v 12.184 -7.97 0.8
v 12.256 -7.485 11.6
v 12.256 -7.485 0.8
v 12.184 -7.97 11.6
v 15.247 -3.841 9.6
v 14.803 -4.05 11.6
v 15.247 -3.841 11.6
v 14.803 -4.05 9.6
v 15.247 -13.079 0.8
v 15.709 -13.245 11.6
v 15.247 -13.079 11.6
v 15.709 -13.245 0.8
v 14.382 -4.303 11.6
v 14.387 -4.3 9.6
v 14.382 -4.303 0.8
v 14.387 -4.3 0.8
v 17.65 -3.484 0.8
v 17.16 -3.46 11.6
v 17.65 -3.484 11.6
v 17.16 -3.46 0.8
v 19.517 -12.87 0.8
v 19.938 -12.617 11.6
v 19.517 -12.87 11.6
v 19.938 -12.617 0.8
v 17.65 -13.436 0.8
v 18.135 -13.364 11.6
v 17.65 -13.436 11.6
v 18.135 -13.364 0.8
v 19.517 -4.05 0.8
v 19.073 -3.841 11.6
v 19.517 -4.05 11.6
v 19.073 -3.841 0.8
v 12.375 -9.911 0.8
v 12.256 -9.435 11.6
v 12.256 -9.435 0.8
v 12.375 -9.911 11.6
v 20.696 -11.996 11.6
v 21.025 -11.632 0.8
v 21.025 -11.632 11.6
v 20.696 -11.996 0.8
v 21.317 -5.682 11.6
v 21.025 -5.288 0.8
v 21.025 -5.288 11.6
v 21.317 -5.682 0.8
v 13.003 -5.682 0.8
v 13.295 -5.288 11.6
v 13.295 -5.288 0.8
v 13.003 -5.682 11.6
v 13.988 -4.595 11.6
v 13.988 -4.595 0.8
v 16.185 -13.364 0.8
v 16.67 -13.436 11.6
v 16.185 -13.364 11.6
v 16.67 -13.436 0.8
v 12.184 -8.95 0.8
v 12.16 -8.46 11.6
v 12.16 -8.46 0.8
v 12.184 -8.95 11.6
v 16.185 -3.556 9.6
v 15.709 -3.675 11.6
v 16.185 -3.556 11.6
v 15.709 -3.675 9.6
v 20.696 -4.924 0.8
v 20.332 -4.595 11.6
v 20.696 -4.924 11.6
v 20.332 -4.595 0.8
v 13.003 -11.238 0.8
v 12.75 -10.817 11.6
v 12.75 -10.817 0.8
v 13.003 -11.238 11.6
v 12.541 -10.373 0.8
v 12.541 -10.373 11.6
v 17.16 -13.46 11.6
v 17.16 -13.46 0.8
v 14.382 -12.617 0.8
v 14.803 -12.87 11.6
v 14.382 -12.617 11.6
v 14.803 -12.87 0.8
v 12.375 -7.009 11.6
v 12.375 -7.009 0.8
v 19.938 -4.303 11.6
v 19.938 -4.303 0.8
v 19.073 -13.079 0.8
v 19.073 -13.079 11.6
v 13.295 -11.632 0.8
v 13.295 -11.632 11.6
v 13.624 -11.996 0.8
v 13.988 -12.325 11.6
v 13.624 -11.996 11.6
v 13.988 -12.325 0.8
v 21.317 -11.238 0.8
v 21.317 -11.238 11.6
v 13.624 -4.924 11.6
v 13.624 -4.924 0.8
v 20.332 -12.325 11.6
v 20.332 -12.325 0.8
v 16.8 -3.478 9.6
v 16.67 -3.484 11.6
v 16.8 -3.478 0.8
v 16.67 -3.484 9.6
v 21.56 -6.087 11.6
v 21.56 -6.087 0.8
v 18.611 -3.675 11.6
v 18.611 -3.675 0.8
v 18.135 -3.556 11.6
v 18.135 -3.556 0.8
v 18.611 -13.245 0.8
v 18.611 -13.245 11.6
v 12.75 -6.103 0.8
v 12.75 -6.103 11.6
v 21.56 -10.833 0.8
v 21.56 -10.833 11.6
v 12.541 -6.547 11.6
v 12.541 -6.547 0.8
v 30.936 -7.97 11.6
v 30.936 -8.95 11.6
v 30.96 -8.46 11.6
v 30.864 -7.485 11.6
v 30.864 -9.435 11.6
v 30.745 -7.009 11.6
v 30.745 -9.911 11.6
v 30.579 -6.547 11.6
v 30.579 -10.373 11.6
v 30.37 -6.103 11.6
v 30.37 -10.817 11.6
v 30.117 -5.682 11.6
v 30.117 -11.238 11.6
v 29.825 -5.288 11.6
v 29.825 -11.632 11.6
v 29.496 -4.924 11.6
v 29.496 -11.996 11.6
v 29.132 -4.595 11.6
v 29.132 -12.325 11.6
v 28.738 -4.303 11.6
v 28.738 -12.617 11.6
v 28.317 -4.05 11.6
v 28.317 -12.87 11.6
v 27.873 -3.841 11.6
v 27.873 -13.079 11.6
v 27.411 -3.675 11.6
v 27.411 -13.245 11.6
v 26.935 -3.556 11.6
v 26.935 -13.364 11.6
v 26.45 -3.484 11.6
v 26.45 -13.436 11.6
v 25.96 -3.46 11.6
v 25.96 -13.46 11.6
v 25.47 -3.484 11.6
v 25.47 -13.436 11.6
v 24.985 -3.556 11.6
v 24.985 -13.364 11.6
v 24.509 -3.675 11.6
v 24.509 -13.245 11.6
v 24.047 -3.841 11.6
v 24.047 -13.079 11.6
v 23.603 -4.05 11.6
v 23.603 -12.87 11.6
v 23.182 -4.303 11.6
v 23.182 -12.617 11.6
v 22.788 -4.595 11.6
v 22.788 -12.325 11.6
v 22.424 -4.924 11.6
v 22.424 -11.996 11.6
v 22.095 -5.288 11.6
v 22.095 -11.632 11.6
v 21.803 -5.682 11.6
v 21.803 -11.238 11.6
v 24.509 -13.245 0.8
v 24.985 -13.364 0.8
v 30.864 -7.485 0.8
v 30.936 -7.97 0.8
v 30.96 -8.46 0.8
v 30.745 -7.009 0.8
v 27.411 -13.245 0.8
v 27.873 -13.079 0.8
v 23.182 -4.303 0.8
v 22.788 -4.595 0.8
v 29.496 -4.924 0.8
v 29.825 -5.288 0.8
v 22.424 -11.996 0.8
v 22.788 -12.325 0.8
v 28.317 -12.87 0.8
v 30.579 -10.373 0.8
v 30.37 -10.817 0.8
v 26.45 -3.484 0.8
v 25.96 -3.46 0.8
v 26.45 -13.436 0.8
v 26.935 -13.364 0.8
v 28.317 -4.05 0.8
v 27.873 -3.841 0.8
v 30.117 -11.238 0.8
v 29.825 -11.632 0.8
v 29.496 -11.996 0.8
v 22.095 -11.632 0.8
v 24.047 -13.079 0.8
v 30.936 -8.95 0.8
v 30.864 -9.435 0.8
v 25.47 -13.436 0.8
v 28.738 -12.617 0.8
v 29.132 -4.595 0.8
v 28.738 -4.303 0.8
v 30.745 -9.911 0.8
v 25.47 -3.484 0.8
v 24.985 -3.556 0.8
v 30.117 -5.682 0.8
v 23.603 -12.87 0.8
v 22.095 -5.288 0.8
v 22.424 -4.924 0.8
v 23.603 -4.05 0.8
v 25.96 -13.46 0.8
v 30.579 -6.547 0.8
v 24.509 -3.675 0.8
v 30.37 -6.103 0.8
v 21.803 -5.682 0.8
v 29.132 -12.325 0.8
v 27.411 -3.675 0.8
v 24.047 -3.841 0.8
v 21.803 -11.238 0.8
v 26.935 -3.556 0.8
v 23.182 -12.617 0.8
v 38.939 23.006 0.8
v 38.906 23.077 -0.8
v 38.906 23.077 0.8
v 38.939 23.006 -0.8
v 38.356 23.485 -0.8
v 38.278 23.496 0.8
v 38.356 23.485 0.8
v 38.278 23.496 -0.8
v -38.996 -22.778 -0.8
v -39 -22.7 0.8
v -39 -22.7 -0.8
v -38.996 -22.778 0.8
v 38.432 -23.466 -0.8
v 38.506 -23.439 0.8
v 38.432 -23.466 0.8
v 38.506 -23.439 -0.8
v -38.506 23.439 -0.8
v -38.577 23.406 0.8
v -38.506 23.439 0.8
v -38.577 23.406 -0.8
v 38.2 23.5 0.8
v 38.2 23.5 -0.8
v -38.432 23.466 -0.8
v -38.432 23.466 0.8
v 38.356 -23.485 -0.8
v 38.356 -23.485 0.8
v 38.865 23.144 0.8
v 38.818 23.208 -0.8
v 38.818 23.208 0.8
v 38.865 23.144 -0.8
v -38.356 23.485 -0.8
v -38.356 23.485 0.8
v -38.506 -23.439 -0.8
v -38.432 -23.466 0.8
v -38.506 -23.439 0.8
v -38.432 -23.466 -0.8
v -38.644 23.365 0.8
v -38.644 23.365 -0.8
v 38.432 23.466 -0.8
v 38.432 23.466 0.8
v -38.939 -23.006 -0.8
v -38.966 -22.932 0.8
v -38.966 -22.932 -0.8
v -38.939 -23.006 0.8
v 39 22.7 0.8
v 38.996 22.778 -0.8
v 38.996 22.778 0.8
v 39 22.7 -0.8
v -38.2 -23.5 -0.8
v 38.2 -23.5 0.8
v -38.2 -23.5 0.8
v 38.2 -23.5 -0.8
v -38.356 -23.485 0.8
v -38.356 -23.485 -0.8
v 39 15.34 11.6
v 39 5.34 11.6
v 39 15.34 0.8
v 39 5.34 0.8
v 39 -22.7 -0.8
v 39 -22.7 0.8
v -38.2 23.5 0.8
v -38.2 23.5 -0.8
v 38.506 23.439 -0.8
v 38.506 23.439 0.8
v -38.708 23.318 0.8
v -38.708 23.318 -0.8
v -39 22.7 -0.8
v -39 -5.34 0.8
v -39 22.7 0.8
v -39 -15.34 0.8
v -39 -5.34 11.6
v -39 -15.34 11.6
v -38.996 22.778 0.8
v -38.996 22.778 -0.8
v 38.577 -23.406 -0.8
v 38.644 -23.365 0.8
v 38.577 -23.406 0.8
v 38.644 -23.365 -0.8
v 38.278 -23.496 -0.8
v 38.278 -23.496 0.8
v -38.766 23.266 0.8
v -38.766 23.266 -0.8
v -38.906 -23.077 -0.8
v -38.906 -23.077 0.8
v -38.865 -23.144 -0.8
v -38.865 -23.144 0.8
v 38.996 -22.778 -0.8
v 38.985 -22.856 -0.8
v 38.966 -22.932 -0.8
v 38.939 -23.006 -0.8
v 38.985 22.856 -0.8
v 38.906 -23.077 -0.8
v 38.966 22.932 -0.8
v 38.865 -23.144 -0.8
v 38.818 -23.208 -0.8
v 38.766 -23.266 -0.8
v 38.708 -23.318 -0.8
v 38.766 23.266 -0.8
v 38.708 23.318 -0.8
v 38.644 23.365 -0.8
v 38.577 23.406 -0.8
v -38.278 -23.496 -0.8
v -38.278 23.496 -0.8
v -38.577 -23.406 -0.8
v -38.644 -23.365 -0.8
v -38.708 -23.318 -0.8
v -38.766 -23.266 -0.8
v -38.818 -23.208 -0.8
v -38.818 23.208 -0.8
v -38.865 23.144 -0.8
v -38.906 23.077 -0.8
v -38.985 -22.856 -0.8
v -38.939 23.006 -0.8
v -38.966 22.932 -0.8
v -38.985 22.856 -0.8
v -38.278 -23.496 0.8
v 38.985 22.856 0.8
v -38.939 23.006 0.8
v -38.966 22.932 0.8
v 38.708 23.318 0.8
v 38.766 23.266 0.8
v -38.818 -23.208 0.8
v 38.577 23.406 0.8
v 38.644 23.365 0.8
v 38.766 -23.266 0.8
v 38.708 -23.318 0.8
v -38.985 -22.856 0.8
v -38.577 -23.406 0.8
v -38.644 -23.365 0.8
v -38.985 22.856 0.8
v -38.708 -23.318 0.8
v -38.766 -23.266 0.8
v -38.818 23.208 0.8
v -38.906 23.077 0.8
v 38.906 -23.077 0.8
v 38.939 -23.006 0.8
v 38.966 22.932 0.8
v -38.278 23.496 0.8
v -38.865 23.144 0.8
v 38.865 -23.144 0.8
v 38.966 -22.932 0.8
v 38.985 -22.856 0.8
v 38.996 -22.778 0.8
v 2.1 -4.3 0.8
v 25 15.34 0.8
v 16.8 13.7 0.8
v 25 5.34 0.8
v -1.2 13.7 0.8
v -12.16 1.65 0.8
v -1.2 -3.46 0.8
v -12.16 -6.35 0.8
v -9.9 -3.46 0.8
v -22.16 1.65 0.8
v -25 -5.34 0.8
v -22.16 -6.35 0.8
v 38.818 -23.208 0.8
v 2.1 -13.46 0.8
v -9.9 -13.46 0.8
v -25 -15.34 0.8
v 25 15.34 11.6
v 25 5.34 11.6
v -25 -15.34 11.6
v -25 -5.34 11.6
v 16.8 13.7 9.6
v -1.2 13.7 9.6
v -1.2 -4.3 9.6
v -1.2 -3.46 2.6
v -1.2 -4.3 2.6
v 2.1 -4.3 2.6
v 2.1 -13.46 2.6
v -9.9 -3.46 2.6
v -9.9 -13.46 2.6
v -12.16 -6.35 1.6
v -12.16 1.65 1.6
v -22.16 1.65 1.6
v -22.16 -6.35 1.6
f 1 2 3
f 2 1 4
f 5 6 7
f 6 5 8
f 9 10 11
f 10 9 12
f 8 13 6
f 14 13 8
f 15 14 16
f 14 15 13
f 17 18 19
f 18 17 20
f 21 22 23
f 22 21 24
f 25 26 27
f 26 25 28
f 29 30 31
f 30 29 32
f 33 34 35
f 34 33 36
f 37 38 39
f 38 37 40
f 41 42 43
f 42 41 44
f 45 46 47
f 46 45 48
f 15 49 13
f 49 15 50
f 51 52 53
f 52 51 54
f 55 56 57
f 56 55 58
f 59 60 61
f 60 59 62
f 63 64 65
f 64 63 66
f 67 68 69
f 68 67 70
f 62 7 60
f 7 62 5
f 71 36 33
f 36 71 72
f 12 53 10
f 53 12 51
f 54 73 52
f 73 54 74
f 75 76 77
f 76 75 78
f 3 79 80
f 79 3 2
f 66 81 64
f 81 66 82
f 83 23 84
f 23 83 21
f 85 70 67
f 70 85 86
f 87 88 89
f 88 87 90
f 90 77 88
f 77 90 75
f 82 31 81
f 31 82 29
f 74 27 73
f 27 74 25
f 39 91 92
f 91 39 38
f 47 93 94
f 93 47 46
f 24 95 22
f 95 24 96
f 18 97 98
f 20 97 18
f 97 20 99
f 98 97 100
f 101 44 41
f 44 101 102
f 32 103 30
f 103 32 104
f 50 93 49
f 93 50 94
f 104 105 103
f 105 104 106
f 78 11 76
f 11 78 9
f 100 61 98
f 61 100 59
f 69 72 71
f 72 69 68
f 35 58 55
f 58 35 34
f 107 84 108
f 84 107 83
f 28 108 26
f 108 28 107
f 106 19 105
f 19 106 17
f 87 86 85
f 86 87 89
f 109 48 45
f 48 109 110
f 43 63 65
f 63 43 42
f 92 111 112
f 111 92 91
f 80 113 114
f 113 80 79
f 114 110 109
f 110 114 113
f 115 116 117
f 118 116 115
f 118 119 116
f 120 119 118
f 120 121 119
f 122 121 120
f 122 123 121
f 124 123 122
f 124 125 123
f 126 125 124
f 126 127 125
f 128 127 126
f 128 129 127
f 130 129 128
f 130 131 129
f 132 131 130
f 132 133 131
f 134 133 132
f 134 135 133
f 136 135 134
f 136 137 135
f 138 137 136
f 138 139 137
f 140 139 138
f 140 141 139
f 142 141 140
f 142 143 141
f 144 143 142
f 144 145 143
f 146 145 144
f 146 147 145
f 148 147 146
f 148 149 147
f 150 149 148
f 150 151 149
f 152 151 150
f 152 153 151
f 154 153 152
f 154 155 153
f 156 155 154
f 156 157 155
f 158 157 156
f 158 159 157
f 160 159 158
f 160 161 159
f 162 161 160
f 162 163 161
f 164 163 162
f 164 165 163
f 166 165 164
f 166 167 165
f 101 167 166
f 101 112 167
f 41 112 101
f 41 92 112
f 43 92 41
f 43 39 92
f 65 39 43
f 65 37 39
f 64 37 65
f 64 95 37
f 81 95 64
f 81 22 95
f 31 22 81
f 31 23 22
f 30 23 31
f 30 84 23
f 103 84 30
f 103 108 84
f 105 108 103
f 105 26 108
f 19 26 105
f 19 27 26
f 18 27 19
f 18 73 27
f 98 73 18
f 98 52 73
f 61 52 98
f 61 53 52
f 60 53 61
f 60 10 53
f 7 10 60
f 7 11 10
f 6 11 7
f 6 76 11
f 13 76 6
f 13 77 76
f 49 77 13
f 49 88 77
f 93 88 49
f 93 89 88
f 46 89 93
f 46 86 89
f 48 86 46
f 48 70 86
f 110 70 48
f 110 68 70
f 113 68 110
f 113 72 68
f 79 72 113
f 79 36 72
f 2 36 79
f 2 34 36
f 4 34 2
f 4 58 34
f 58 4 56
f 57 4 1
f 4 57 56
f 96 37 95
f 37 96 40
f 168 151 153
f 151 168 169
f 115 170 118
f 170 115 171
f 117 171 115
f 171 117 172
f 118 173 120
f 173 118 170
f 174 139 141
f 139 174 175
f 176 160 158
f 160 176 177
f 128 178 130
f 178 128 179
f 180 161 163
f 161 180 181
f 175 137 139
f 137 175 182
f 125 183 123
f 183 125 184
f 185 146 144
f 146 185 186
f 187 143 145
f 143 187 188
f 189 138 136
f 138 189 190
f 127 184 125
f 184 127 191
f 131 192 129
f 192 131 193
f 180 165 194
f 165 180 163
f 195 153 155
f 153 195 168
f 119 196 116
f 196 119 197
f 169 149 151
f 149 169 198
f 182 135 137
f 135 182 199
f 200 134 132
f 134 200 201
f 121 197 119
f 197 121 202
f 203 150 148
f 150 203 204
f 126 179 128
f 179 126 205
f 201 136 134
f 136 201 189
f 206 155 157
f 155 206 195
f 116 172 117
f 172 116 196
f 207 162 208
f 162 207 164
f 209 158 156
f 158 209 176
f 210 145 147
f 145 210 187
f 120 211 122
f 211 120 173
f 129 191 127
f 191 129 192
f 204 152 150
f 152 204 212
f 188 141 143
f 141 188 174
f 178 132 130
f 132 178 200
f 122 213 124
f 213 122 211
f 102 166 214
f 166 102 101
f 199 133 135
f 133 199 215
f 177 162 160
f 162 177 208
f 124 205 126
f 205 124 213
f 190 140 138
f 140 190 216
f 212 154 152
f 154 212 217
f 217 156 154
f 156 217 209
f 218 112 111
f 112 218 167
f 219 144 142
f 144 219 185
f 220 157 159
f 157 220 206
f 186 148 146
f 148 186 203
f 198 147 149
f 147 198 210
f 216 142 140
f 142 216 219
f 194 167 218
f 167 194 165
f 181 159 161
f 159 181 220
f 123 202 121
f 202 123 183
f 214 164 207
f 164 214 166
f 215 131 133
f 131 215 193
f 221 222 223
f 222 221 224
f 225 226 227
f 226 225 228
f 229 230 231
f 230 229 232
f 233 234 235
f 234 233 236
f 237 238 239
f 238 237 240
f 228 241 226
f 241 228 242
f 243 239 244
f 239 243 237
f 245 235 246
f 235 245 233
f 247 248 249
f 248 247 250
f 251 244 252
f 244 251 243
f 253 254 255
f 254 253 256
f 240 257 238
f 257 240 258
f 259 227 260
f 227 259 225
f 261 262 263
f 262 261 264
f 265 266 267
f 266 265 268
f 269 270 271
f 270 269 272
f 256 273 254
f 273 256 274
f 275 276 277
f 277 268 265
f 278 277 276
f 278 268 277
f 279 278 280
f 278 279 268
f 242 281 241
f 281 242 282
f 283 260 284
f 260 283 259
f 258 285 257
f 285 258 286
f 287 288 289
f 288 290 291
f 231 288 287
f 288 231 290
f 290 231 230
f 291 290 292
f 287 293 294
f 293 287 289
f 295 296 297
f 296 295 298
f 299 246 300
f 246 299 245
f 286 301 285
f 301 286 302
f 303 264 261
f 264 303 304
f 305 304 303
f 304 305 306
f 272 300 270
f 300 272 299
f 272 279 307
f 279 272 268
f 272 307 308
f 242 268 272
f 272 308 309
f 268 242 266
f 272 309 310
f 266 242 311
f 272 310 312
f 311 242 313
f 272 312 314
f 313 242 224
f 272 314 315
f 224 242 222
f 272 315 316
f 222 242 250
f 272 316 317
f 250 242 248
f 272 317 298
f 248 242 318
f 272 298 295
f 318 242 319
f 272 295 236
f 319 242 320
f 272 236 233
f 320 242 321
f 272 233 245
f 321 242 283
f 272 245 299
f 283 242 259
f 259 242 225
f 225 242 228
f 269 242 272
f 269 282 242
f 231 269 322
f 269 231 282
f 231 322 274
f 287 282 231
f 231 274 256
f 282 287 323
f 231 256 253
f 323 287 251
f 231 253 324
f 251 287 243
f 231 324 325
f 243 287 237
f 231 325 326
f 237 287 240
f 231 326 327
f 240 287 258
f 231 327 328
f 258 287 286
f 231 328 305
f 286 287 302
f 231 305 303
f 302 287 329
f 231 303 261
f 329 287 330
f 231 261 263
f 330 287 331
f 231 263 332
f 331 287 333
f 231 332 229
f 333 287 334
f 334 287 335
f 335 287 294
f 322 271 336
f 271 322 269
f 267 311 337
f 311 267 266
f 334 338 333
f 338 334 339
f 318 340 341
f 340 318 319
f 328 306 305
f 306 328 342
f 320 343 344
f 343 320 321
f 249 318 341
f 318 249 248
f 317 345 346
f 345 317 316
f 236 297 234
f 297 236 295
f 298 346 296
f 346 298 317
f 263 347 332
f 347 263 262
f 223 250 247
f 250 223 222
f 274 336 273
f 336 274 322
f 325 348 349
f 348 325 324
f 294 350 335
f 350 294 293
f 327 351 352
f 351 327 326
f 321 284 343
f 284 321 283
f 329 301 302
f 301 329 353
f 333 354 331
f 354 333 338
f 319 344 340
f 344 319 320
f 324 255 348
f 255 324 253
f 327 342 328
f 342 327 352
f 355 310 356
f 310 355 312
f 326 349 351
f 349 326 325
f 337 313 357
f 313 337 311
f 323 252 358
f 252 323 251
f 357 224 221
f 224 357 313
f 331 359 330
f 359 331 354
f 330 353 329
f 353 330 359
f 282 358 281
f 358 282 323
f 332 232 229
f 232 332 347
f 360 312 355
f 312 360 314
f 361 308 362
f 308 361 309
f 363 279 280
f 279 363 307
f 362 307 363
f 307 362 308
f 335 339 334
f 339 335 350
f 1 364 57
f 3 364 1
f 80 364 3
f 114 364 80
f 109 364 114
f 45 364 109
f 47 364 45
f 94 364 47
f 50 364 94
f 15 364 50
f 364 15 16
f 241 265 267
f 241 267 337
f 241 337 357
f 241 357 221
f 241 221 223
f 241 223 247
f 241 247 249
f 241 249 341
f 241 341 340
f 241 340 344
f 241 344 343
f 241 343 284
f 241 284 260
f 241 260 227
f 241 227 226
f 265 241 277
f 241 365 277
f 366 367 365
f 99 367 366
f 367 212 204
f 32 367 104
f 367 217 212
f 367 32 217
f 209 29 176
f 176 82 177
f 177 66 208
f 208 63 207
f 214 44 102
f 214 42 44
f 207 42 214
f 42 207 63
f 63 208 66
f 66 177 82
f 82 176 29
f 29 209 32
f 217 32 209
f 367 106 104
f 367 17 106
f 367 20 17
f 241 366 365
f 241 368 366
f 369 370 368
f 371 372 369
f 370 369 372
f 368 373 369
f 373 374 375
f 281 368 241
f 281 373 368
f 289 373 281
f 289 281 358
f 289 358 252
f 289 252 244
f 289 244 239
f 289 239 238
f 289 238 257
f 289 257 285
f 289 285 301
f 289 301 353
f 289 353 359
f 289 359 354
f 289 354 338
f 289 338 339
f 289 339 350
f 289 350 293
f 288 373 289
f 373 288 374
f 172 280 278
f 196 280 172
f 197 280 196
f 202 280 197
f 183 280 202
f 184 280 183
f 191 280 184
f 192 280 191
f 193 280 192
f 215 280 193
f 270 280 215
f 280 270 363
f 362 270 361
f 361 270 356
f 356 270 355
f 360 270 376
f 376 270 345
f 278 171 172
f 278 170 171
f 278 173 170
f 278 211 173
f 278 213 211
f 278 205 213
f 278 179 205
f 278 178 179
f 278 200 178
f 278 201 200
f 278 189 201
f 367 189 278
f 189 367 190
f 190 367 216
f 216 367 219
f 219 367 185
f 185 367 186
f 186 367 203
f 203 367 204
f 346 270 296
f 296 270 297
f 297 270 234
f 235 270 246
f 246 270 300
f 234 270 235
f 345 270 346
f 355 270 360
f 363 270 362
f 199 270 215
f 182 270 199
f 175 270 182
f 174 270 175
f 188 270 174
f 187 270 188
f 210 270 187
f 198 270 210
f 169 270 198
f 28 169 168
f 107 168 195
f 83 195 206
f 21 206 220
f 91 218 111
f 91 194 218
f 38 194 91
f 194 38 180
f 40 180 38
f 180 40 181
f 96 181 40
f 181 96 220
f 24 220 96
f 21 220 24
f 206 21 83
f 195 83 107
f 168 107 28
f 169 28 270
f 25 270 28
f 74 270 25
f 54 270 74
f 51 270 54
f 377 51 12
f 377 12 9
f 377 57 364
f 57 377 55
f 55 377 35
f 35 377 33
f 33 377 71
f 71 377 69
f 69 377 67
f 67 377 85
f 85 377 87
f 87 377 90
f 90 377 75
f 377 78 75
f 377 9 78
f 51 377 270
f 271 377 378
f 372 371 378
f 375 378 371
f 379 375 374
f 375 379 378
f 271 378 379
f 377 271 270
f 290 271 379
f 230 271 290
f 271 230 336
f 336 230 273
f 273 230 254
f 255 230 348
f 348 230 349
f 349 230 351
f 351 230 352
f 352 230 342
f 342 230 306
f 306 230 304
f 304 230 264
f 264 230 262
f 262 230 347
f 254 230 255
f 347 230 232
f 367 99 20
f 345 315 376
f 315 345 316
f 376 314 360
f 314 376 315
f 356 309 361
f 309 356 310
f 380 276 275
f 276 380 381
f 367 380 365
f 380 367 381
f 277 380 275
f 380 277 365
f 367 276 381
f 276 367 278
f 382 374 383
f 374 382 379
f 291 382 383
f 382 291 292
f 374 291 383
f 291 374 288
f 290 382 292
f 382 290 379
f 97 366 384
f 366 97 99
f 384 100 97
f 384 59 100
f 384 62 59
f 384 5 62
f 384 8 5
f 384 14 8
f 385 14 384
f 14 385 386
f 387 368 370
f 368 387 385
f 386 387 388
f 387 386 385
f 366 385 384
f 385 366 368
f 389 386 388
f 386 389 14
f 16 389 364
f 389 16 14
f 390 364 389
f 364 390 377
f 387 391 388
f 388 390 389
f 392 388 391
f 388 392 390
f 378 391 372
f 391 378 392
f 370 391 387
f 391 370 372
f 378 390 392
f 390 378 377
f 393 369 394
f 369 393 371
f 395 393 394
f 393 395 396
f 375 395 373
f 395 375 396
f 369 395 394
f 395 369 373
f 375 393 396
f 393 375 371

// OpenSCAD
// DC-DC power converter module (single connected solid)
// Overall PCB: 78.0mm x 47.0mm x 1.6mm

pcb_length = 78.0;
pcb_width  = 47.0;
pcb_thickness = 1.6;

corner_r = 0.8;   // modest rounding
$fn = 64;

// Use a real overlap (1-2mm) to guarantee watertight connections
overlap = 1.2;

// --- Helper: rounded rectangle prism (exact outer size) ---
module rounded_rect_prism(L, W, H, R) {
    hull() {
        for (sx = [-1, 1], sy = [-1, 1])
            translate([sx*(L/2 - R), sy*(W/2 - R), 0])
                cylinder(r=R, h=H, center=true);
    }
}

// --- Helper: place a component so it is guaranteed to intersect the PCB by `overlap` ---
module on_pcb(shape_h, child_geom) {
    // PCB top surface is at +pcb_thickness/2 (because PCB is centered at z=0)
    // Put component so its bottom goes `overlap` into the PCB:
    // z_center = pcb_top + shape_h/2 - overlap
    translate([0, 0, pcb_thickness/2 + shape_h/2 - overlap])
        children();
}

// --- Main assembly: PCB + representative components (all connected) ---
module dcdc_module() {

    // Component sizing (representative, not brand-specific)
    // Add a "bond pad" that actually intersects the PCB by `overlap`
    bond_h = 1.6; // thick enough to be robust; will be sunk into PCB by overlap

    // Inductor (large block)
    ind_L = 18;
    ind_W = 18;
    ind_H = 10;

    // Electrolytic capacitors (cylinders)
    cap_r = 5.0;
    cap_H = 12.0;

    // Terminal blocks (input/output)
    term_L = 14;
    term_W = 10;
    term_H = 12;

    // IC / controller
    ic_L = 12;
    ic_W = 10;
    ic_H = 3.0;

    // Small parts cluster
    smd_L = 10;
    smd_W = 8;
    smd_H = 2.0;

    // Positions (kept as in original design intent)
    out_term_pos = [ pcb_length/2 - term_L/2,  pcb_width*0.22, 0];
    in_term_pos  = [-pcb_length/2 + term_L/2, -pcb_width*0.22, 0];
    ind_pos      = [ pcb_length*0.10,         pcb_width*0.10, 0];
    cap1_pos     = [ pcb_length*0.22,        -pcb_width*0.18, 0];
    cap2_pos     = [ pcb_length*0.34,        -pcb_width*0.18, 0];
    ic_pos       = [-pcb_length*0.05,        -pcb_width*0.18, 0];
    smd_pos      = [-pcb_length*0.22,        -pcb_width*0.05, 0];

    // Ensure the paired cylinders are truly merged (remove seam/gap):
    // Make them overlap slightly by reducing center-to-center spacing.
    cap_pair_dx = (cap_r * 2) - overlap; // overlap by `overlap` mm

    union() {
        // PCB
        rounded_rect_prism(pcb_length, pcb_width, pcb_thickness, corner_r);

        // --- Output terminal block (right edge) ---
        translate(out_term_pos)
            on_pcb(term_H)
                cube([term_L, term_W, term_H], center=true);
        // Bond pad (guaranteed intersection into PCB)
        translate(out_term_pos)
            on_pcb(bond_h)
                cube([term_L, term_W, bond_h], center=true);

        // --- Input terminal block (left edge) ---
        translate(in_term_pos)
            on_pcb(term_H)
                cube([term_L, term_W, term_H], center=true);
        translate(in_term_pos)
            on_pcb(bond_h)
                cube([term_L, term_W, bond_h], center=true);

        // --- Inductor (upper middle) ---
        translate(ind_pos)
            on_pcb(ind_H)
                cube([ind_L, ind_W, ind_H], center=true);
        translate(ind_pos)
            on_pcb(bond_h)
                cube([ind_L, ind_W, bond_h], center=true);

        // --- Two capacitors (near right side) ---
        // Build as a single fused solid (pair union) + a fused bond pad under them.
        translate([cap1_pos[0] + cap_pair_dx/2, cap1_pos[1], 0]) {
            // Capacitor bodies fused
            on_pcb(cap_H)
                union() {
                    translate([-cap_pair_dx/2, 0, 0]) cylinder(r=cap_r, h=cap_H, center=true);
                    translate([ cap_pair_dx/2, 0, 0]) cylinder(r=cap_r, h=cap_H, center=true);
                }
            // Bond pad fused (also overlaps into PCB)
            on_pcb(bond_h)
                union() {
                    translate([-cap_pair_dx/2, 0, 0]) cylinder(r=cap_r, h=bond_h, center=true);
                    translate([ cap_pair_dx/2, 0, 0]) cylinder(r=cap_r, h=bond_h, center=true);
                }
        }

        // --- Controller IC (lower middle) ---
        translate(ic_pos)
            on_pcb(ic_H)
                cube([ic_L, ic_W, ic_H], center=true);
        translate(ic_pos)
            on_pcb(bond_h)
                cube([ic_L, ic_W, bond_h], center=true);

        // --- Small SMD cluster (near IC) ---
        translate(smd_pos)
            on_pcb(smd_H)
                cube([smd_L, smd_W, smd_H], center=true);
        translate(smd_pos)
            on_pcb(bond_h)
                cube([smd_L, smd_W, bond_h], center=true);
    }
}

dcdc_module();
